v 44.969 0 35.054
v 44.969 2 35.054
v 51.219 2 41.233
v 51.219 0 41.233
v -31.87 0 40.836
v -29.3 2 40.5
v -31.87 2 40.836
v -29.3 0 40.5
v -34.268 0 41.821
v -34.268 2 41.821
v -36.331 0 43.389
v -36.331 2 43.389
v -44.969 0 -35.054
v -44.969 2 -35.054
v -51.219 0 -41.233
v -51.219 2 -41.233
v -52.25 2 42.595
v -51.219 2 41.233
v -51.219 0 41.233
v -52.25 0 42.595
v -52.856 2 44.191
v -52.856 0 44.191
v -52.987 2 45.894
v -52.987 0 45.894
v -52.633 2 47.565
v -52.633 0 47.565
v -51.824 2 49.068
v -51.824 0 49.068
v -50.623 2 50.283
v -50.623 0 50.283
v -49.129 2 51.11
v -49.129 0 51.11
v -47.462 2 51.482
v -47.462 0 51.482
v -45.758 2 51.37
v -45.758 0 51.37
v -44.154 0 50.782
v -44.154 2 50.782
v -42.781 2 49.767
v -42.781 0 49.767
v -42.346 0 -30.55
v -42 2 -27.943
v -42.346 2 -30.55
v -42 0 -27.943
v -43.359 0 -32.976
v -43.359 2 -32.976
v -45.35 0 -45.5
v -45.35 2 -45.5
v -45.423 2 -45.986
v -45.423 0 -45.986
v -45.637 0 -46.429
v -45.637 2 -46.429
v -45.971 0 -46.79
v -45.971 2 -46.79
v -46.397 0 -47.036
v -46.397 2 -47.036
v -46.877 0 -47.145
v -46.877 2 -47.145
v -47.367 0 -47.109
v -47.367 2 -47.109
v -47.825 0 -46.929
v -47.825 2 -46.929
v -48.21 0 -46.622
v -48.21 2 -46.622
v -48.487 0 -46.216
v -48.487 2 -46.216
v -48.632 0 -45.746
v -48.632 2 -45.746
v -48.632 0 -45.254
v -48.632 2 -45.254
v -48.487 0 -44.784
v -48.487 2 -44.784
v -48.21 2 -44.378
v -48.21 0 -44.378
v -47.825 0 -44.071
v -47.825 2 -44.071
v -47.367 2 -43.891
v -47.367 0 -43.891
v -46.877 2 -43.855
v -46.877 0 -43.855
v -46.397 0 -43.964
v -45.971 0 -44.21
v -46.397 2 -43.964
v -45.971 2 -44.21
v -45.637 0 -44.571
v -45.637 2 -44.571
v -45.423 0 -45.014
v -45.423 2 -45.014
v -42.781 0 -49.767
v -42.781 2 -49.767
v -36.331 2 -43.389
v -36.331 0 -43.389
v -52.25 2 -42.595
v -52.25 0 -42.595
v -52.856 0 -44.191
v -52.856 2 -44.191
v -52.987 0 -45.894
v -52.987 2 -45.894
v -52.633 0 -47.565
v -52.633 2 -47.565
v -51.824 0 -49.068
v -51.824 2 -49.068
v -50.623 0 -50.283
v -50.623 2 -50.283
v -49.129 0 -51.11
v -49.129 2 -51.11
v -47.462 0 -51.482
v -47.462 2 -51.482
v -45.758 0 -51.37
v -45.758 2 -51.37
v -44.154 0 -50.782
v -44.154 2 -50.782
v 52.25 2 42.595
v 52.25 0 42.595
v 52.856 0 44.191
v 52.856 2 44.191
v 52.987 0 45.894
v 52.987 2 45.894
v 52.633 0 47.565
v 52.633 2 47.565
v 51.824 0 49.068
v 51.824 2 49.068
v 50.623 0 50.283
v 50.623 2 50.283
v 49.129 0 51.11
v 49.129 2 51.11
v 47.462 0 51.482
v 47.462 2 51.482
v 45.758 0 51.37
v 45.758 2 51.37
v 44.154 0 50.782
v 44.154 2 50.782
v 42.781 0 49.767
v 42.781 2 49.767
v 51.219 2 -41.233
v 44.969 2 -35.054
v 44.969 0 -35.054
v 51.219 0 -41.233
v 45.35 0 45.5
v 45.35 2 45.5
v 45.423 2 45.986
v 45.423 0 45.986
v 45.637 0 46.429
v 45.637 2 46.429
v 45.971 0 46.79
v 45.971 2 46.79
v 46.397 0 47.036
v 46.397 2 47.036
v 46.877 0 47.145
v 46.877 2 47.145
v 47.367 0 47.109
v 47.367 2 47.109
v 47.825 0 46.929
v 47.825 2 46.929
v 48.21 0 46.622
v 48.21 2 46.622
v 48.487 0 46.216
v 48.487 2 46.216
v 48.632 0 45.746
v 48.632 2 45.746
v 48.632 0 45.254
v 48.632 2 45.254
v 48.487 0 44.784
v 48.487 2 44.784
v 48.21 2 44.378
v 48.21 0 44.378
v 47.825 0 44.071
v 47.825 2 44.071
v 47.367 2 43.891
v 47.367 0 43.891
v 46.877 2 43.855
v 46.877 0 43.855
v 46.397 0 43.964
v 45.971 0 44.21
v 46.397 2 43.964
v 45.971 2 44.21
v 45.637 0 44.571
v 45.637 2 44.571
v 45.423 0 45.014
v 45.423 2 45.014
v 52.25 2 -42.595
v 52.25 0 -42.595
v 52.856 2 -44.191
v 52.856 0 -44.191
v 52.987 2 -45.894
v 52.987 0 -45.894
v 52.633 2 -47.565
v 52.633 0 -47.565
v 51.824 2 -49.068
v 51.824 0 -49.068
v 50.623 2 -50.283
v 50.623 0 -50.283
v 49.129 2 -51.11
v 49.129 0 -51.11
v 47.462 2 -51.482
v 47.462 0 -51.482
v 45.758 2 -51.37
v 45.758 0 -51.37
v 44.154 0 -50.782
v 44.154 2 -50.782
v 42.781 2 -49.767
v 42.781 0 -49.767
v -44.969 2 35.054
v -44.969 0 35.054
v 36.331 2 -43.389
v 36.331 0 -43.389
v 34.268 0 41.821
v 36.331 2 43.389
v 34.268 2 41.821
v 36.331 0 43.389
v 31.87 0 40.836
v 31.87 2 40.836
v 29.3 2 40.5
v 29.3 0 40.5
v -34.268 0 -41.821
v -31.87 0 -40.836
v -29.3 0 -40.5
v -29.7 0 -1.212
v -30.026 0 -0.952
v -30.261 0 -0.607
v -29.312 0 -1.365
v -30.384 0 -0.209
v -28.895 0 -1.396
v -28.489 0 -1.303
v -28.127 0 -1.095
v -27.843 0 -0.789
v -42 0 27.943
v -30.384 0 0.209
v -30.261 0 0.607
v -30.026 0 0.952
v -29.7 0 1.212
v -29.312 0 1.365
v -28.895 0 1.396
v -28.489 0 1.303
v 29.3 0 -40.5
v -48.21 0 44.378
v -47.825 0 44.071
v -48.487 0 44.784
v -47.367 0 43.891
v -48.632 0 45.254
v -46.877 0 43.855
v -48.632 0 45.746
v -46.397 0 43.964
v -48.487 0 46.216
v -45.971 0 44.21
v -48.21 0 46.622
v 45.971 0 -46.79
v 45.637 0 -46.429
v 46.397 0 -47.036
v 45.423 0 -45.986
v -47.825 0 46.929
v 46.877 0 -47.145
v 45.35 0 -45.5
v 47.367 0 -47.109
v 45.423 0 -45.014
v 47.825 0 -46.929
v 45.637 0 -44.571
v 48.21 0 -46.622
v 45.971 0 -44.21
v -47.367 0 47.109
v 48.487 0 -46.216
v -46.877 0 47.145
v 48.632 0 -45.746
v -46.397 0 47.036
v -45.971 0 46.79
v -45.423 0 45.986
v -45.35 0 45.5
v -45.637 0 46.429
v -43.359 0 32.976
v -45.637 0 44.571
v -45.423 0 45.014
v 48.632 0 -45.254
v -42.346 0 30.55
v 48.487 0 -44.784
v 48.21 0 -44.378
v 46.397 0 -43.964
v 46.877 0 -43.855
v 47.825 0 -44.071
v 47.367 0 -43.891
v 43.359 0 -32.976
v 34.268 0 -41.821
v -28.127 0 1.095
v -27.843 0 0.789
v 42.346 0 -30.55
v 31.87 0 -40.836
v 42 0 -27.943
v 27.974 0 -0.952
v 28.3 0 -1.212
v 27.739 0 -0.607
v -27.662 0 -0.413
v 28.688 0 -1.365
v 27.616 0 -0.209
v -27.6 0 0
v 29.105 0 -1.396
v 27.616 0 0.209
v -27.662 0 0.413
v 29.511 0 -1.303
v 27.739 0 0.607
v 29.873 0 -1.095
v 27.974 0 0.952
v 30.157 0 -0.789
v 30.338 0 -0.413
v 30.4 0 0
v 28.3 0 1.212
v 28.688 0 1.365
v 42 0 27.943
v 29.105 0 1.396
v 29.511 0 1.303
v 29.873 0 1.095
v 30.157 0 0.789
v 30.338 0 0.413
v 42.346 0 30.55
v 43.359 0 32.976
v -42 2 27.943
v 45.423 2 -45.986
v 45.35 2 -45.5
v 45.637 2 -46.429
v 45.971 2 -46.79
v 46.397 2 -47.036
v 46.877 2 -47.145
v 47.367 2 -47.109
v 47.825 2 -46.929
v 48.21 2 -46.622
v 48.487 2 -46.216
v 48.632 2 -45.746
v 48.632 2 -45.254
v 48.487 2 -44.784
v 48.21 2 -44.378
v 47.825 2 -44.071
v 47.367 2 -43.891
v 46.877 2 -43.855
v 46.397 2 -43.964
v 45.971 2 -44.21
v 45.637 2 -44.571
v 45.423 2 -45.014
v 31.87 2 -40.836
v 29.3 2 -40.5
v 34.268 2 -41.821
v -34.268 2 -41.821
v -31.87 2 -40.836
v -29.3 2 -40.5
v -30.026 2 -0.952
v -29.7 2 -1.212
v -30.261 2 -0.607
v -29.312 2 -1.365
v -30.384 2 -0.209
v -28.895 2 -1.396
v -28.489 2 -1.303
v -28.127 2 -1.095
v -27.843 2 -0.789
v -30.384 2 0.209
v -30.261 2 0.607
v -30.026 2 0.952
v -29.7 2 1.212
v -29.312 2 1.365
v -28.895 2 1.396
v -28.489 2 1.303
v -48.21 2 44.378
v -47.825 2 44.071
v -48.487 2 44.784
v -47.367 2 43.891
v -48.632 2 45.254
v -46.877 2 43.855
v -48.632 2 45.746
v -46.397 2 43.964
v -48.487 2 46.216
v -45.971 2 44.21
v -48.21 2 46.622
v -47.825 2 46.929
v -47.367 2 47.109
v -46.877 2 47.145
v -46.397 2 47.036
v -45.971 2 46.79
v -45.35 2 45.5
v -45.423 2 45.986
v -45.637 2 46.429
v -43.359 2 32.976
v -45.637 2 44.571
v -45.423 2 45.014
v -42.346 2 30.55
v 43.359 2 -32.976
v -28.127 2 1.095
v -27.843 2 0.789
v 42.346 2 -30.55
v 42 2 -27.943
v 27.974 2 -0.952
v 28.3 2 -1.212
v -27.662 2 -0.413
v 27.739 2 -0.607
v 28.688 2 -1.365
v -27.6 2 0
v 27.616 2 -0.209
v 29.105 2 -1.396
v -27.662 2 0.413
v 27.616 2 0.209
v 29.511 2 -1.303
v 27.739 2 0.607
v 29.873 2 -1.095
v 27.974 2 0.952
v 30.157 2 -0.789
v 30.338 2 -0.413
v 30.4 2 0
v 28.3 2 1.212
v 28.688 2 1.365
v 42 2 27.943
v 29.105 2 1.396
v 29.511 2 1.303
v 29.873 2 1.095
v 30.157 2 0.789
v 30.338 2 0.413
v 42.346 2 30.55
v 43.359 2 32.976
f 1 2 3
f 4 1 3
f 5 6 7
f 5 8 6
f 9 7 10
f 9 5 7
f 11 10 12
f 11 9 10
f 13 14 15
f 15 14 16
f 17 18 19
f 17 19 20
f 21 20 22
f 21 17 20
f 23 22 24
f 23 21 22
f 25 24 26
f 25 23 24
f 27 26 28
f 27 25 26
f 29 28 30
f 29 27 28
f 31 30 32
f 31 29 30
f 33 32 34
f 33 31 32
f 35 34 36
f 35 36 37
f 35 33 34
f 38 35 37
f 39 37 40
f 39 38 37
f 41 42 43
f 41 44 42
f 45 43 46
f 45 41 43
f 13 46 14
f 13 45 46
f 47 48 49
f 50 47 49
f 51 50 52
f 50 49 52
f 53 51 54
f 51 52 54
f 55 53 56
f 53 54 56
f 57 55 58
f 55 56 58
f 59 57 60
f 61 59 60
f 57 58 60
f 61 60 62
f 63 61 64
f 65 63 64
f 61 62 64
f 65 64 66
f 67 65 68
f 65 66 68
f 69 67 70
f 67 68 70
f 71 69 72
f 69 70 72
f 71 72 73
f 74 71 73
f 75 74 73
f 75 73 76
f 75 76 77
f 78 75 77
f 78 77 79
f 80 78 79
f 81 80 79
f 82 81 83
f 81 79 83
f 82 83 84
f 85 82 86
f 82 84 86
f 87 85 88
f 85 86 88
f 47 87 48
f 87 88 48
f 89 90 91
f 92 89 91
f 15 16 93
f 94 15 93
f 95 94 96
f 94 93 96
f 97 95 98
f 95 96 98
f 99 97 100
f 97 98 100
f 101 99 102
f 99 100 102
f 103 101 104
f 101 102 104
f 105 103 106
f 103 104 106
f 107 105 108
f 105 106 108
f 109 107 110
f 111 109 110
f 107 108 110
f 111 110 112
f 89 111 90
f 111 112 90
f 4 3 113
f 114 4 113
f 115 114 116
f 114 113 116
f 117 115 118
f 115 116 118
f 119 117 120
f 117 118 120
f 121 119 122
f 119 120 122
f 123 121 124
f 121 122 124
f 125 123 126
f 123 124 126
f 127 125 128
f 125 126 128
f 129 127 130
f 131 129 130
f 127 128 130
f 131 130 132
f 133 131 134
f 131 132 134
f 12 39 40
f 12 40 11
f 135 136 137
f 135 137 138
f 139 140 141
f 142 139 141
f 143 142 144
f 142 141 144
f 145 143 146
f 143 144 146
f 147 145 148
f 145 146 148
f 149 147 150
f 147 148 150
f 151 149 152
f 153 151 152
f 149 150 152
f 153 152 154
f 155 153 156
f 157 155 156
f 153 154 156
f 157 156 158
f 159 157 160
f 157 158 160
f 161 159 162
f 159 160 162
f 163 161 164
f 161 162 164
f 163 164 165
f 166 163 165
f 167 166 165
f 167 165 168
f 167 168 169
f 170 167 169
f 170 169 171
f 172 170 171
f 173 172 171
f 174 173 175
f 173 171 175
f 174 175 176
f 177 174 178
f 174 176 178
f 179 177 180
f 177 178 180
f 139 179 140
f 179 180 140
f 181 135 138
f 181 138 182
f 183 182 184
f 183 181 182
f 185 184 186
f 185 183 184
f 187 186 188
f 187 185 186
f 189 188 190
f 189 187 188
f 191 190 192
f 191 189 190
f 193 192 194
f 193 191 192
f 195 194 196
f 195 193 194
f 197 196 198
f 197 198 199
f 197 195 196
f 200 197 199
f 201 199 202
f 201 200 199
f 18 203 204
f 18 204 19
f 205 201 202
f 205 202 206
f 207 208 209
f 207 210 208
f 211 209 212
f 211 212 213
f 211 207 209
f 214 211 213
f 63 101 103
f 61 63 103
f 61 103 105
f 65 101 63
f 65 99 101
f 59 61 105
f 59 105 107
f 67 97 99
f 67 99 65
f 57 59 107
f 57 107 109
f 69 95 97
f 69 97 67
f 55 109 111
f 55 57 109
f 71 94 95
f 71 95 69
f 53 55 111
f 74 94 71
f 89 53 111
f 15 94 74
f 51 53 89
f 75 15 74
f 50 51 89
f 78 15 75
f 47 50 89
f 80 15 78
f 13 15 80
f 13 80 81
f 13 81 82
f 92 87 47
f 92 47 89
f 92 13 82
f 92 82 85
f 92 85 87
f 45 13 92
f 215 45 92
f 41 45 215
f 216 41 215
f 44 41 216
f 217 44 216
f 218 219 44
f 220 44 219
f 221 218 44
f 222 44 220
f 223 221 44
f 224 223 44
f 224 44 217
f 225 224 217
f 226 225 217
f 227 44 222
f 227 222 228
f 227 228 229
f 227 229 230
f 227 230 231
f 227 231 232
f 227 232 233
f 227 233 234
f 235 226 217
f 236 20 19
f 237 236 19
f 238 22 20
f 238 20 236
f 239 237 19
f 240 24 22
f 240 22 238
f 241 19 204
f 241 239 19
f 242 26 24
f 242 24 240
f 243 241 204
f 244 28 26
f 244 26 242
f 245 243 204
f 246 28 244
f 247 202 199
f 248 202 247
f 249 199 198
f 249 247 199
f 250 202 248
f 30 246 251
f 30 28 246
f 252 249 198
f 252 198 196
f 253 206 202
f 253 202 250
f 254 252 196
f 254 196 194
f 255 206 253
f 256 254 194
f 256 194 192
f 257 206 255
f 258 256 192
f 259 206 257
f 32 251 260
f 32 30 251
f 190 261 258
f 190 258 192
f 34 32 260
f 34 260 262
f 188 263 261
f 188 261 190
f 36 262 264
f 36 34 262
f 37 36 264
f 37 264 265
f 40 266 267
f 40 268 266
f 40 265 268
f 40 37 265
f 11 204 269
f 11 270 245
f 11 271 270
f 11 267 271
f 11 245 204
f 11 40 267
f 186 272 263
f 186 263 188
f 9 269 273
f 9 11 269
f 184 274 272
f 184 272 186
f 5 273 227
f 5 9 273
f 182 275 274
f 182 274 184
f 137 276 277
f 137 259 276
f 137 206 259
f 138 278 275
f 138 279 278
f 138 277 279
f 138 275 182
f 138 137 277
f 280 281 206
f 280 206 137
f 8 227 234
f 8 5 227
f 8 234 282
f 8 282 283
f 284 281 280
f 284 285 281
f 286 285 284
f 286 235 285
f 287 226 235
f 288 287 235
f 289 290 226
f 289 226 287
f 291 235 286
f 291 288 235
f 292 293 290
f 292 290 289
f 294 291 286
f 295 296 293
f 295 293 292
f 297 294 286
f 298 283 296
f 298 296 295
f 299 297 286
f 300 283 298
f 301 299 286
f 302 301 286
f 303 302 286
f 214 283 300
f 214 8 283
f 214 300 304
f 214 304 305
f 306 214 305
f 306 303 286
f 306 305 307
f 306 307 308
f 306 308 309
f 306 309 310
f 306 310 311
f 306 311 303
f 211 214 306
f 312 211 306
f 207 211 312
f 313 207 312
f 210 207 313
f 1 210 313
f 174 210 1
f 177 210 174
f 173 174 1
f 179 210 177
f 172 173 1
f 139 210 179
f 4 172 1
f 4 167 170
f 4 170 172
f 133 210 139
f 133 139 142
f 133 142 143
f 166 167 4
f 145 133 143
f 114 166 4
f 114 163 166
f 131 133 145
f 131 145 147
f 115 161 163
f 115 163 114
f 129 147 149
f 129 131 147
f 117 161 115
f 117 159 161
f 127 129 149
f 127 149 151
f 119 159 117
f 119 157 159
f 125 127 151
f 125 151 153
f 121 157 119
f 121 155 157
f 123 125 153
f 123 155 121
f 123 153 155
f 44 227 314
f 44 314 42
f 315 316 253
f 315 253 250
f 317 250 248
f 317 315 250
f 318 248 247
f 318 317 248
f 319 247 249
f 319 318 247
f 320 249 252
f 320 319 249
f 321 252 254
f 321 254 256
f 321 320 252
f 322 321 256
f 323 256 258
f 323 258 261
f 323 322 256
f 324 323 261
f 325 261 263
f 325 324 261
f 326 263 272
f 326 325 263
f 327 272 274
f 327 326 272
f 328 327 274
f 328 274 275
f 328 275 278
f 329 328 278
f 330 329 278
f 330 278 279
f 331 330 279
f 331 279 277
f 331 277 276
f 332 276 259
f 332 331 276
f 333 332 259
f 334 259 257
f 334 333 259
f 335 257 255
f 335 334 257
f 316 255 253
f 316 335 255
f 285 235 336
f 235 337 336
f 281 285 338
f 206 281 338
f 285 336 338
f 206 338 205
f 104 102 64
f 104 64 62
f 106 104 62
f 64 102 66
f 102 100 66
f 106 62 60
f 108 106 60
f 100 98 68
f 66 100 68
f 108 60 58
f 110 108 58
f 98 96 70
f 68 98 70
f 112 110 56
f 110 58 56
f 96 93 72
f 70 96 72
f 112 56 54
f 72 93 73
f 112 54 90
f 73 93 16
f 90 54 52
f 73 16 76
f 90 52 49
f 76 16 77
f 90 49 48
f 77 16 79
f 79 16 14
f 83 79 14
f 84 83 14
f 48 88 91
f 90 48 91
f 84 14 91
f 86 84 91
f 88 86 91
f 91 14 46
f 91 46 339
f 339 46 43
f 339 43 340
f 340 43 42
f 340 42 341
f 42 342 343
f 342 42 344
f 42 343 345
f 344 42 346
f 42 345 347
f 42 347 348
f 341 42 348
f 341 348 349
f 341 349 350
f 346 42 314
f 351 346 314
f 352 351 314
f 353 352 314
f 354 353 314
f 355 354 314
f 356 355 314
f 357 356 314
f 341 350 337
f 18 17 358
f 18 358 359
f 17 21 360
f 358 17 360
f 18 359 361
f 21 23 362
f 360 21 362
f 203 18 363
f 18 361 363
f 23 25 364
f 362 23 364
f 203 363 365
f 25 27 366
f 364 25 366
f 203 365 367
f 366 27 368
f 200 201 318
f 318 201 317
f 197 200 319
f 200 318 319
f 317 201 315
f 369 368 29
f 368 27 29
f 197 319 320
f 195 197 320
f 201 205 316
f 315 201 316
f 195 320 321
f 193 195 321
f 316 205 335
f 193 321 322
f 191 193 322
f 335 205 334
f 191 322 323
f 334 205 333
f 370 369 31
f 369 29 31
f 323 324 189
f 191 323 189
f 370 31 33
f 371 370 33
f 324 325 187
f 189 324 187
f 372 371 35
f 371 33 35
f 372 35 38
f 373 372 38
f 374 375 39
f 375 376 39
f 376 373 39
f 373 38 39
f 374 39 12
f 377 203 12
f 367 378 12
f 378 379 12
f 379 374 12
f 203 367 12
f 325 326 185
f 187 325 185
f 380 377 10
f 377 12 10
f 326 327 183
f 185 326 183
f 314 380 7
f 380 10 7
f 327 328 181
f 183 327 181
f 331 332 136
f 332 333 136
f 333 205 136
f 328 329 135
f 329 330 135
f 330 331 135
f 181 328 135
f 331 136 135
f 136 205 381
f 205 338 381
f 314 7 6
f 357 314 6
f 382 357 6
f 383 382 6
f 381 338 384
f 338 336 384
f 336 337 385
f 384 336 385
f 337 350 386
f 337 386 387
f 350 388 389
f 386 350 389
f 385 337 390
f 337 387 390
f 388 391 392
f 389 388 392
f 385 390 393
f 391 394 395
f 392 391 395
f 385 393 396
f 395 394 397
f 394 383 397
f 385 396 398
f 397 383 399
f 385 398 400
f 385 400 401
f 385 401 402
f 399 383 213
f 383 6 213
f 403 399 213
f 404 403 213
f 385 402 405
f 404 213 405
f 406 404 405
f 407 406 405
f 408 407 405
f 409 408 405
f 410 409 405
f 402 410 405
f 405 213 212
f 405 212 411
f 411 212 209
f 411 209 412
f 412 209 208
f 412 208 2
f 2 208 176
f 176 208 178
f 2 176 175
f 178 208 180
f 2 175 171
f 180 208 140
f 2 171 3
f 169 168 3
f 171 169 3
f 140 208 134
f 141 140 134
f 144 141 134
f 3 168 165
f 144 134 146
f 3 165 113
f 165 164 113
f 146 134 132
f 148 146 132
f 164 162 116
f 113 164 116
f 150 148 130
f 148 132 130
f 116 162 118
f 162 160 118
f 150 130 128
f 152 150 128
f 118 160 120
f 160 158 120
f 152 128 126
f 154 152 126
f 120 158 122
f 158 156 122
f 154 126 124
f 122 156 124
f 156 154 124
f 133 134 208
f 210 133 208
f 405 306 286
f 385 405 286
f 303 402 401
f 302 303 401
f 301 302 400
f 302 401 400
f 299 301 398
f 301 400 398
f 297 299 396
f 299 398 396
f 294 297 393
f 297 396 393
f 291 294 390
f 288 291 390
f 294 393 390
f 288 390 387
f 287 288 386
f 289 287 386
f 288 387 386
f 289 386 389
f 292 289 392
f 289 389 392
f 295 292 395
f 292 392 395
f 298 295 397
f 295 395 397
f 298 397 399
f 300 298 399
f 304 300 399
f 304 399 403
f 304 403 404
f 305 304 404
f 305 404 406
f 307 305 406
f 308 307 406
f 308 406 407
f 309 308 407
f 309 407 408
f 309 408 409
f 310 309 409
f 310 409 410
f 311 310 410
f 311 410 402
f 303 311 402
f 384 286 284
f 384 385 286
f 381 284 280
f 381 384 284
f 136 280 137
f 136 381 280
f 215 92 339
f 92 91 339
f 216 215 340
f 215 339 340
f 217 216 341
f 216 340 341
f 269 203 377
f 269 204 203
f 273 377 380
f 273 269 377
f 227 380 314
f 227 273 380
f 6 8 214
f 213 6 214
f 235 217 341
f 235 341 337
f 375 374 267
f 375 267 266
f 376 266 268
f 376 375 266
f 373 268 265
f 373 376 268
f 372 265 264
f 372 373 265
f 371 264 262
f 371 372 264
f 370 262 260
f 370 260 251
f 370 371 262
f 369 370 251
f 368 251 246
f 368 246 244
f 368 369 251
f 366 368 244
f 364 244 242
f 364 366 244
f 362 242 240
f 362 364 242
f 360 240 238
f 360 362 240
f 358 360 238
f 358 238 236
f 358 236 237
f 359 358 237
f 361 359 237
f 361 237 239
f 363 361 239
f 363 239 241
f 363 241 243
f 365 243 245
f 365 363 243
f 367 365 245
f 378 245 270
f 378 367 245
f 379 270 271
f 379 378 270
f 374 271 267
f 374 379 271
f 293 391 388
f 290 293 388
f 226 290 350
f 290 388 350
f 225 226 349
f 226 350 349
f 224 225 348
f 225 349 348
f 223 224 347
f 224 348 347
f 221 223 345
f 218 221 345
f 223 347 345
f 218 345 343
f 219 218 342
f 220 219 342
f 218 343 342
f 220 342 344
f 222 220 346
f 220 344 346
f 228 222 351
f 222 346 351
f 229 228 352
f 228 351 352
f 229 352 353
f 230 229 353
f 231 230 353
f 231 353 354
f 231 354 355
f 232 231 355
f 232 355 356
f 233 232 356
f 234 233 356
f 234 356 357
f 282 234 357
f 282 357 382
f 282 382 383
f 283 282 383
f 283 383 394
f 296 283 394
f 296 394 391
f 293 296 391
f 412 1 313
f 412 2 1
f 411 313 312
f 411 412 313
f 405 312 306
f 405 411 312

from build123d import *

# Parameters (mm, degrees)
SKETCH1_W               = 84
SKETCH1_H               = 81
BOSS_EXTRUDE1_DEPTH     = 2
SKETCH2_R               = 1.65
BOSS_EXTRUDE2_DEPTH     = 2
MIRROR2_COPY_1_SKETCH_R = 1.65
MIRROR2_COPY_1_DEPTH    = 2
FILLET1_R               = 10
SKETCH3_R               = 1.4
CUT_EXTRUDE1_DEPTH      = 3


with BuildPart() as part:
    # Sketch1 → Boss-Extrude1 (new body)
    with BuildSketch(Plane(origin=(0, 0, 0), x_dir=(1, 0, 0), z_dir=(0, 1, 0))):
        Rectangle(SKETCH1_W, SKETCH1_H)
    extrude(amount=BOSS_EXTRUDE1_DEPTH)

    # Sketch2 → Boss-Extrude2 (add)
    with BuildSketch(Plane(origin=(0, 2, 0), x_dir=(1, 0, 0), z_dir=(0, 1, 0))):
        with BuildLine():
            Line((-42.781426662, 49.766572276), (-32.781426662, 39.879072276))
            ThreePointArc((-32.781426662, 39.879072276), (-32.733427724, 31.393926662), (-41.218573338, 31.345927724))
            Line((-41.218573338, 31.345927724), (-51.218573338, 41.233427724))
            ThreePointArc((-51.218573338, 41.233427724), (-51.266572276, 49.718573338), (-42.781426662, 49.766572276))
        make_face()
        with Locations((-47, 45.5)):
            Circle(SKETCH2_R, mode=Mode.SUBTRACT)
    boss_extrude2 = extrude(amount=-BOSS_EXTRUDE2_DEPTH)

    # Mirror1: Boss-Extrude2 across plane
    add(boss_extrude2.mirror(Plane.XY))

    # Mirror2: Boss-Extrude2 across plane
    add(boss_extrude2.mirror(Plane(origin=(0, 0, 0), x_dir=(0, 0, 1), z_dir=(1, 0, 0))))

    # Mirror2 copy 1 sketch → Mirror2 copy 1 (add)
    with BuildSketch(Plane(origin=(0, 2, 0), x_dir=(-1, 0, 0), z_dir=(0, 1, 0))):
        with BuildLine():
            Line((-42.781426662, 49.766572276), (-32.781426662, 39.879072276))
            ThreePointArc((-32.781426662, 39.879072276), (-32.733427724, 31.393926662), (-41.218573338, 31.345927724))
            Line((-41.218573338, 31.345927724), (-51.218573338, 41.233427724))
            ThreePointArc((-51.218573338, 41.233427724), (-51.266572276, 49.718573338), (-42.781426662, 49.766572276))
        make_face()
        with Locations((-47, 45.5)):
            Circle(MIRROR2_COPY_1_SKETCH_R, mode=Mode.SUBTRACT)
    extrude(amount=-MIRROR2_COPY_1_DEPTH)

    # Fillet1
    fillet1_edges = [part.edges().sort_by_distance(p)[0] for p in [
        (-42, 1, -32.118563335),
        (-33.409419303, 1, -40.5),
        (-42, 1, 32.118563335),
        (-33.409419303, 1, 40.5),
        (42, 1, -32.118563335),
        (33.409419303, 1, -40.5),
        (42, 1, 32.118563335),
        (33.409419303, 1, 40.5),
    ]]
    fillet(fillet1_edges, radius=FILLET1_R)

    # Sketch3 → Cut-Extrude1 (cut, through all)
    with BuildSketch(Plane(origin=(0, 2, 0), x_dir=(1, 0, 0), z_dir=(0, 1, 0))):
        with Locations((-29, 0)):
            Circle(SKETCH3_R)
        with Locations((29, 0)):
            Circle(SKETCH3_R)
    extrude(amount=-CUT_EXTRUDE1_DEPTH, mode=Mode.SUBTRACT)


solid = part.part
